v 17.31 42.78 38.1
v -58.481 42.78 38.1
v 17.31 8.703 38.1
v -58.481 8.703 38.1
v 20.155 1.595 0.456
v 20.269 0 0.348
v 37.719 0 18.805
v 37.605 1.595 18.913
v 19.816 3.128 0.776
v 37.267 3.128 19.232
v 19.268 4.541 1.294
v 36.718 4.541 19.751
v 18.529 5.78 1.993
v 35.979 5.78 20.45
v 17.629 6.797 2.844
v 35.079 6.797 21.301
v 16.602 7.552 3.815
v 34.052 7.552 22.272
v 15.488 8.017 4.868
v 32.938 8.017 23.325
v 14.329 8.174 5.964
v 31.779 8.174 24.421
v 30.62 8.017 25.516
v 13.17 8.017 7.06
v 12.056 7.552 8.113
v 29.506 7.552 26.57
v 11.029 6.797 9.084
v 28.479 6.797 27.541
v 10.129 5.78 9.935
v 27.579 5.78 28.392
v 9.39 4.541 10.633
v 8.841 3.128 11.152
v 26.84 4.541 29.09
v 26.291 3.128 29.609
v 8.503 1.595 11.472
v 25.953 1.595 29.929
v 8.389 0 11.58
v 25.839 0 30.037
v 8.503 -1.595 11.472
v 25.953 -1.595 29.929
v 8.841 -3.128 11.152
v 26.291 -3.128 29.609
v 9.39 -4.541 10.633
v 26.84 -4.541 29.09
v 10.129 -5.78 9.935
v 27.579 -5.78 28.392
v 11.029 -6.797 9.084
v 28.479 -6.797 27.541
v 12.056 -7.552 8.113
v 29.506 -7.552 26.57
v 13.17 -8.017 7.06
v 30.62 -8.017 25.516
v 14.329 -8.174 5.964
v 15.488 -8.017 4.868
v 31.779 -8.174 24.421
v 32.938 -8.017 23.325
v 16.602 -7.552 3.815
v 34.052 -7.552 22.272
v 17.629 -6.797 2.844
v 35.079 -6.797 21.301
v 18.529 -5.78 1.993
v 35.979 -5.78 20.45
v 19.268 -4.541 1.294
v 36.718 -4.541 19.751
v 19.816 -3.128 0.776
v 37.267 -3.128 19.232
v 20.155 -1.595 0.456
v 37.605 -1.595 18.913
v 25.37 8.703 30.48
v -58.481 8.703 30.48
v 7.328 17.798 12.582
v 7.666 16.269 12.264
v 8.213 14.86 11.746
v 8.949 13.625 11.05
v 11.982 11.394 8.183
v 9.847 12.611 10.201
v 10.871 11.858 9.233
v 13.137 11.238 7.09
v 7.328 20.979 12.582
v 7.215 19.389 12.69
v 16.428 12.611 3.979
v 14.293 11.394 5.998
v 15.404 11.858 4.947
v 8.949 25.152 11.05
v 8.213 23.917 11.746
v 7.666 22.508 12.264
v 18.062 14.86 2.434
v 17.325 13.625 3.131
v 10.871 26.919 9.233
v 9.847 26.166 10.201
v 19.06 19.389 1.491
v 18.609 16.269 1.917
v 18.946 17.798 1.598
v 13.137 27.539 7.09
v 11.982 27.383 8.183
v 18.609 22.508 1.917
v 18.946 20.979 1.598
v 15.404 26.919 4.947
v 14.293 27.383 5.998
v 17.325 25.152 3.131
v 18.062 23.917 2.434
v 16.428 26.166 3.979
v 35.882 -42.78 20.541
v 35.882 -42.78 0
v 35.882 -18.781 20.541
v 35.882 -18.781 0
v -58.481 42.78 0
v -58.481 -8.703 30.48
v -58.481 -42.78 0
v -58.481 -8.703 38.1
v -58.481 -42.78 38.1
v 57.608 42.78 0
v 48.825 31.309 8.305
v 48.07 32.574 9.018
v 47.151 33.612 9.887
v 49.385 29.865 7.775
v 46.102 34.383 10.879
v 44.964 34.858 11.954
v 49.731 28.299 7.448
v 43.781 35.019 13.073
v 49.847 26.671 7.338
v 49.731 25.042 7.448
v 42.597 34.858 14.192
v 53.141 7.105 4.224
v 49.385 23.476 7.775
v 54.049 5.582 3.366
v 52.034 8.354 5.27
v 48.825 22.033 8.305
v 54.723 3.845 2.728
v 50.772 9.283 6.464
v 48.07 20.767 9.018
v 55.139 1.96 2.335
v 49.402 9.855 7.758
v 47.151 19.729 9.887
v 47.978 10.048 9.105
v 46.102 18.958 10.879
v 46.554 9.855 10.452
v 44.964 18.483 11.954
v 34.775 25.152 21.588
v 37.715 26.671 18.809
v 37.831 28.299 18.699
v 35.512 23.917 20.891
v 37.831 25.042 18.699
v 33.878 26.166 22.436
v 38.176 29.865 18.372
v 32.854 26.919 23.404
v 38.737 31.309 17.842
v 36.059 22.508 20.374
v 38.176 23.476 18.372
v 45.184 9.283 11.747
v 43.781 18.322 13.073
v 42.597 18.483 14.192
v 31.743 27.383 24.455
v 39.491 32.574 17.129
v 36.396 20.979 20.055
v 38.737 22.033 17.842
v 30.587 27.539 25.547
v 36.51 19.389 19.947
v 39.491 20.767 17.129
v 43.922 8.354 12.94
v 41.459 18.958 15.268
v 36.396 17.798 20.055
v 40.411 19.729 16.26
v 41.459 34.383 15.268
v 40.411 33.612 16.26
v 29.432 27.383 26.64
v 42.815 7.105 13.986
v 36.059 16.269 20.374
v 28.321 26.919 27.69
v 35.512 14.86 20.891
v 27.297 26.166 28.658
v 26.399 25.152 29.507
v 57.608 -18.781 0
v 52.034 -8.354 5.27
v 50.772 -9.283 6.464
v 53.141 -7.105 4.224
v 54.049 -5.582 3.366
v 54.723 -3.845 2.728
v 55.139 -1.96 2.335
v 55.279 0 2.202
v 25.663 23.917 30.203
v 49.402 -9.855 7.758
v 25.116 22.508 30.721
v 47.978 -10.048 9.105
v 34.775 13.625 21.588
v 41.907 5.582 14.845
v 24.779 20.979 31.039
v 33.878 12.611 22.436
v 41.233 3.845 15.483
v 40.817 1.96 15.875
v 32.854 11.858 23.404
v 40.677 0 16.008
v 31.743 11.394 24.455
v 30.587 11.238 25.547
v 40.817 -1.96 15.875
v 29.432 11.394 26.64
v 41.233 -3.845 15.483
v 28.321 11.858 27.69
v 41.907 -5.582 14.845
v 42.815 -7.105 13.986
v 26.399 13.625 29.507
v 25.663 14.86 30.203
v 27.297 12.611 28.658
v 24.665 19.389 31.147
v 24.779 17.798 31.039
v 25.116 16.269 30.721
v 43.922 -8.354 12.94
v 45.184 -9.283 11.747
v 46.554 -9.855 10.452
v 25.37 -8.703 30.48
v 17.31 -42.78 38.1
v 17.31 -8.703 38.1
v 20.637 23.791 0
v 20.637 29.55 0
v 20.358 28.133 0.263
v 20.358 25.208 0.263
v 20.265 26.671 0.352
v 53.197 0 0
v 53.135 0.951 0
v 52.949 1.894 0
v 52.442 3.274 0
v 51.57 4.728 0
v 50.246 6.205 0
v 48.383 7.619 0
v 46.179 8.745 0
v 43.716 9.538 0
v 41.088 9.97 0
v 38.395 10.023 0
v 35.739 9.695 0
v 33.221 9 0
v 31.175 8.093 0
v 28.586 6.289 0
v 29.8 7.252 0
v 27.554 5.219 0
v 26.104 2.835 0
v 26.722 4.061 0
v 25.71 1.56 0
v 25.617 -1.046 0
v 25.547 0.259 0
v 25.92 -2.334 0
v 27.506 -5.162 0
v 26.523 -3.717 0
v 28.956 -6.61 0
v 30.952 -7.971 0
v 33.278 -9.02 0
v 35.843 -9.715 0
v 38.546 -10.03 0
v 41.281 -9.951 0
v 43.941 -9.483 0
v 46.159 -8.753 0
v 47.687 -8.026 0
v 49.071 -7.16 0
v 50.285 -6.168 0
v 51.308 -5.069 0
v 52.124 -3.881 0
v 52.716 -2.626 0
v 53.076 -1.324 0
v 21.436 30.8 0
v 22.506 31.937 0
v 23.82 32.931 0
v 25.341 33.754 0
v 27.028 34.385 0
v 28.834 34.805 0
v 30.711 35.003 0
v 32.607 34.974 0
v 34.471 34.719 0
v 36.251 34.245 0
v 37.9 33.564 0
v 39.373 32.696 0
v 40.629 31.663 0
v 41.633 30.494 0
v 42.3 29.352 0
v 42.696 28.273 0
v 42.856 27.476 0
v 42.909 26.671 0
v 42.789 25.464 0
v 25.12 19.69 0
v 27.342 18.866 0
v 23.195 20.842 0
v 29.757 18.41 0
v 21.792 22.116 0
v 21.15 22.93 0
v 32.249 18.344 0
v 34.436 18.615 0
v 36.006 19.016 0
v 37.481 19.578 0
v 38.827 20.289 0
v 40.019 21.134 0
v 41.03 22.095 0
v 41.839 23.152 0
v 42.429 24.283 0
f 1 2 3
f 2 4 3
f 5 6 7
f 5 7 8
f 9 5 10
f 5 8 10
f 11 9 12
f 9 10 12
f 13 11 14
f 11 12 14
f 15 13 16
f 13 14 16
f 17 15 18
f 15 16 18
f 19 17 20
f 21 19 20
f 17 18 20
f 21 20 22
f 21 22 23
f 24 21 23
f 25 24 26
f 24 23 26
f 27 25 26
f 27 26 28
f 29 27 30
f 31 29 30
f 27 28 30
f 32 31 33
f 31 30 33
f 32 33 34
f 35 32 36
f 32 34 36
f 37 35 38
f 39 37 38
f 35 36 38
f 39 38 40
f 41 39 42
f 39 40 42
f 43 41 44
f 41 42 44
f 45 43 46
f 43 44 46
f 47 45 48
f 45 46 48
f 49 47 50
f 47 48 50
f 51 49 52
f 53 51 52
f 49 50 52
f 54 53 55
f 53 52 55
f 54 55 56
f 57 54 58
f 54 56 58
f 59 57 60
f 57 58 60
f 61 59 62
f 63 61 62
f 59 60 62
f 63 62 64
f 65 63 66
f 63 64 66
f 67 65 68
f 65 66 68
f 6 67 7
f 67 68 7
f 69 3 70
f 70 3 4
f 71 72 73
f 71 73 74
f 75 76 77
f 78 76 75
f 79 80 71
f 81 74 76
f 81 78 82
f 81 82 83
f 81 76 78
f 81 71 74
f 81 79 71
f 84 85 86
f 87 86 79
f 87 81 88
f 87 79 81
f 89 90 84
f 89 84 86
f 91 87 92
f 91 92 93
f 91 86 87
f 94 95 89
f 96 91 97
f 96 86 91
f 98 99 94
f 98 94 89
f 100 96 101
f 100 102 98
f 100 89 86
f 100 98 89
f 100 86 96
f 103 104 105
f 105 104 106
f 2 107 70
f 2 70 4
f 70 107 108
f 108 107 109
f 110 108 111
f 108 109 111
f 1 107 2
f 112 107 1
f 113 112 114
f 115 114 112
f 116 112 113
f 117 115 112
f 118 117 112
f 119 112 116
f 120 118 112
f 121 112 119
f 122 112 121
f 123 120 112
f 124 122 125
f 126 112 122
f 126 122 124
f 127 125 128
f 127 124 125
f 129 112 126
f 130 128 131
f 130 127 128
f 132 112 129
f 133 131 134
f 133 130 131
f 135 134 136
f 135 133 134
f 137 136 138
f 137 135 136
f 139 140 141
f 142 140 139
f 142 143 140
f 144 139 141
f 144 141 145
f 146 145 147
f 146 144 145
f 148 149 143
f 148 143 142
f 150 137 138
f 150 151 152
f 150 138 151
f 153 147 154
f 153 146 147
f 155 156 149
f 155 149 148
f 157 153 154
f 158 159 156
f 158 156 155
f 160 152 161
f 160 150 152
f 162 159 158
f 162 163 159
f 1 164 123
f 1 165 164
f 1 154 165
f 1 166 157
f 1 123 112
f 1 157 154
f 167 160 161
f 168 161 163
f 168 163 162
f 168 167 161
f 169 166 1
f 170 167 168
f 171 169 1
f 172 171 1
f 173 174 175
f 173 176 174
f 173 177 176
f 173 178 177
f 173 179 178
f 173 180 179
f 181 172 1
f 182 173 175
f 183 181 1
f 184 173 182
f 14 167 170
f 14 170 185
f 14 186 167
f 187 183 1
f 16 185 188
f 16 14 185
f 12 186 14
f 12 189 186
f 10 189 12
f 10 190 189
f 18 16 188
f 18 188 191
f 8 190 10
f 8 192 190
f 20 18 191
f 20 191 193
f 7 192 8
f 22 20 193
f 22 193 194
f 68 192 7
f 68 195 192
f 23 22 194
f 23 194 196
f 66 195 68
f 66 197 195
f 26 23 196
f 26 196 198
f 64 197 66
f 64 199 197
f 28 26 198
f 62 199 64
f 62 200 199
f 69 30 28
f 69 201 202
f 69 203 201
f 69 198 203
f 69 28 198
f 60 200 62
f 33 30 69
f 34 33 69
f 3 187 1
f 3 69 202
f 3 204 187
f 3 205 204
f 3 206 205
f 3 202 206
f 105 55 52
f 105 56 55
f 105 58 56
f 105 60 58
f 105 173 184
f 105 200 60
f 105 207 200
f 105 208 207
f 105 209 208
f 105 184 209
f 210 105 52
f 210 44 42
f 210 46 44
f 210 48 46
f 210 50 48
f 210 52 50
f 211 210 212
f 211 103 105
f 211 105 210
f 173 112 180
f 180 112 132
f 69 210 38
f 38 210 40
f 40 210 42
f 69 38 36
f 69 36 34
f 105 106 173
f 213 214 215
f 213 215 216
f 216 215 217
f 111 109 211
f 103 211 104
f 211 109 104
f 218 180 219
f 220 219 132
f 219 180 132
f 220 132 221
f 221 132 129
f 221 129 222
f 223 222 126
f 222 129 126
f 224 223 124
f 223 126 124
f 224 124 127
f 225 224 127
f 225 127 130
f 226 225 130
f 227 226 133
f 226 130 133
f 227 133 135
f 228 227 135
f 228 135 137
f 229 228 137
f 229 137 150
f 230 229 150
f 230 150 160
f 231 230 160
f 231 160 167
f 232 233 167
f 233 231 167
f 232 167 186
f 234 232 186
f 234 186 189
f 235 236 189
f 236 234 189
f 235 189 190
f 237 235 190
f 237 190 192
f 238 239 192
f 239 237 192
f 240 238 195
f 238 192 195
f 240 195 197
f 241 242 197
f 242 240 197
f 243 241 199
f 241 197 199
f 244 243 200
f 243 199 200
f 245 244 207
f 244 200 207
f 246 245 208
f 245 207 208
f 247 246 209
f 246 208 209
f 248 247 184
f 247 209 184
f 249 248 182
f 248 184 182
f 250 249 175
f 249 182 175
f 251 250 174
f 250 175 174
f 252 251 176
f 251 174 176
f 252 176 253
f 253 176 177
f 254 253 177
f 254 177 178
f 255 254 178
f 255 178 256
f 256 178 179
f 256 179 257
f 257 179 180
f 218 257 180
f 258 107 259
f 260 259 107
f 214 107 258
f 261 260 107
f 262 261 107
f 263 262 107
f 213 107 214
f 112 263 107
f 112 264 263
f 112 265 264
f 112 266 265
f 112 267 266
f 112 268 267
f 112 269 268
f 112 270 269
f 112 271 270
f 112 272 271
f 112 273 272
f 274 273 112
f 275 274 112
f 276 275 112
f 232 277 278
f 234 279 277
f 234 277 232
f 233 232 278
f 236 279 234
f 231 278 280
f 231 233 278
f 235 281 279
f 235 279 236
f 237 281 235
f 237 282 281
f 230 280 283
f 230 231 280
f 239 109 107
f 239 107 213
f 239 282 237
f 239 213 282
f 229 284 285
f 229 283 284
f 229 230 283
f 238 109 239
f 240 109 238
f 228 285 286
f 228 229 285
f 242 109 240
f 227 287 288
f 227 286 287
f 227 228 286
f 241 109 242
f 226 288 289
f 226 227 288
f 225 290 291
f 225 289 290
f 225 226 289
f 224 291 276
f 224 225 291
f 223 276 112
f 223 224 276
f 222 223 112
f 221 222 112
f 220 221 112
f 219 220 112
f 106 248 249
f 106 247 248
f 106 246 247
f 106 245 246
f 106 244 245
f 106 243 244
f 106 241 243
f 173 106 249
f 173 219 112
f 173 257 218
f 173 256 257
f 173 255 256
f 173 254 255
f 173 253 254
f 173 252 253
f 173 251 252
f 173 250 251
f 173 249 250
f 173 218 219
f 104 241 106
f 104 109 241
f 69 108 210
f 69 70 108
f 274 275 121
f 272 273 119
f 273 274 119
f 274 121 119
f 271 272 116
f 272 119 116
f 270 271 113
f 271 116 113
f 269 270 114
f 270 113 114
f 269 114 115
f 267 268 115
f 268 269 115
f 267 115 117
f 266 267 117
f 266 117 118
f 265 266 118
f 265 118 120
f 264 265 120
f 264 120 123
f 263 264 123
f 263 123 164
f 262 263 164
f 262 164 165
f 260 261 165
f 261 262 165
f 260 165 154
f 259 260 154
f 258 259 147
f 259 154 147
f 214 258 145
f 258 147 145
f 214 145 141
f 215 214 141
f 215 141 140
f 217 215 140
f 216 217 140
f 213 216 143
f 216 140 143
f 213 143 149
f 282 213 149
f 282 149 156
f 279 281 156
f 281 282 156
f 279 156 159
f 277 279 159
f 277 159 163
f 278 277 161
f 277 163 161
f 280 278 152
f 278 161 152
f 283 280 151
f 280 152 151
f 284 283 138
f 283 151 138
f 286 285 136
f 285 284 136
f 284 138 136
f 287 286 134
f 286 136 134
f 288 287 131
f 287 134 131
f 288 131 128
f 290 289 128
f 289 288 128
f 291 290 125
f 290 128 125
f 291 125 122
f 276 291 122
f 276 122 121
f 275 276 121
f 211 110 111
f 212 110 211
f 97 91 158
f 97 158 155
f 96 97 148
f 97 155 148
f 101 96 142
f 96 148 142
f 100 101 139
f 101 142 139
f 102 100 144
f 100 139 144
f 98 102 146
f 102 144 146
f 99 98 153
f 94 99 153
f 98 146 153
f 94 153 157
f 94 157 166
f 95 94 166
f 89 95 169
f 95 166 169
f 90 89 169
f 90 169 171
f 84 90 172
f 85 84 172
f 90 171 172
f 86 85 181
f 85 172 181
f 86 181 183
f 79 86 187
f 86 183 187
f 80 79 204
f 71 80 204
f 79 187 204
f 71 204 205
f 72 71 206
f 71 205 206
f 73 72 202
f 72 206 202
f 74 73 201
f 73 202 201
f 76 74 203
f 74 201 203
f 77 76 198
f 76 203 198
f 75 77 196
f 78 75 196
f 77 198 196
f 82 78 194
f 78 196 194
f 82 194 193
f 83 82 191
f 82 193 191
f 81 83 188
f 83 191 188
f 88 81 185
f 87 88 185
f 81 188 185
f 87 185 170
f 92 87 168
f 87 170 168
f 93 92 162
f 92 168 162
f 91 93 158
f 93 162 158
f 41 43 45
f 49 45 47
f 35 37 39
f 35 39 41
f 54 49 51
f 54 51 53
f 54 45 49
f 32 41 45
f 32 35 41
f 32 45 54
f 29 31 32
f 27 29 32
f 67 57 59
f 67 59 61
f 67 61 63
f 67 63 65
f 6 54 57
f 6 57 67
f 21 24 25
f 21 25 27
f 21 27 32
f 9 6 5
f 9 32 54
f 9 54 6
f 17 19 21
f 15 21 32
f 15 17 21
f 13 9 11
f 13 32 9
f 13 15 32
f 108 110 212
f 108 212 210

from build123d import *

# Parameters (mm, degrees)
F0_W      = 116.9611811638
F0_H      = 60.1601935923
F1_DEPTH  = 38.1
F3_DEPTH  = 31.75
F4_W      = 8.79971501
F4_H      = 17.4067560583
F4_W_2    = 75.7910068654
F5_DEPTH  = 7.62
F6_DEPTH  = 12.7
F7_DEPTH  = 12.7
F8_W      = 25.9574428201
F8_H      = 27.7897324413
F9_DEPTH  = 25.4
F10_R     = 8.1507716862
F11_DEPTH = 25.4
F12_R     = 8.1743450513
F13_DEPTH = 25.4
F14_R     = 10.0476315022
F15_DEPTH = 25.4
F16_R     = 8.34829694
F17_DEPTH = 25.4


with BuildPart() as f1:
    # F0 (on Top) → F1 (new body)
    with BuildSketch(Plane.XY):
        Rectangle(F0_W, F0_H)
    extrude(amount=F1_DEPTH)

    # F2 (on Front) → F3 (cut, symmetric)
    with BuildSketch(Plane.XZ):
        Polygon((13.2841020823, 43.822273612), (14.8110100999, 40.4630750418), (65.1989877224, -7.1764695458), (65.1989877224, 43.822273612), align=None)
    extrude(amount=F3_DEPTH, both=True, mode=Mode.SUBTRACT)

    # F4 (on face) → F5 (cut)
    with BuildSketch(Plane.XY.offset(38.1)):
        with Locations((21.7102737885, 0)):
            Rectangle(F4_W, F4_H)
        with Locations((-20.5850871492, 0)):
            Rectangle(F4_W_2, F4_H)
    extrude(amount=-F5_DEPTH, mode=Mode.SUBTRACT)

    # F6 (add): a face of the model
    f6_faces = [f1.faces().sort_by_distance(p)[0] for p in [
        (-9.8052950563, -30.0800967962, 17.7163922315),
    ]]
    extrude(f6_faces, amount=F6_DEPTH)

    # F7 (add): a face of the model
    f7_faces = [f1.faces().sort_by_distance(p)[0] for p in [
        (-9.8052950563, 30.0800967962, 17.7163922315),
    ]]
    extrude(f7_faces, amount=F7_DEPTH)

    # F8 (on Top) → F9 (cut)
    with BuildSketch(Plane.XY):
        with Locations((48.8610677421, -32.6758408919)):
            Rectangle(F8_W, F8_H)
    extrude(amount=F9_DEPTH, mode=Mode.SUBTRACT)

    # F10 (on face) → F11 (cut)
    with BuildSketch(Plane(origin=(27.1903243303, 0, 28.7589956151), x_dir=(0.7266466393, 0, -0.6870113985), z_dir=(0.6870113985, 0, 0.7266466393))):
        with Locations((4.6751173213, 19.3886086345)):
            Circle(F10_R)
    extrude(amount=-F11_DEPTH, mode=Mode.SUBTRACT)

    # F12 (on face) → F13 (cut)
    with BuildSketch(Plane(origin=(27.1903243303, 0, 28.7589956151), x_dir=(0.7266466393, 0, -0.6870113985), z_dir=(0.6870113985, 0, 0.7266466393))):
        with Locations((6.3146823086, 0)):
            Circle(F12_R)
    extrude(amount=-F13_DEPTH, mode=Mode.SUBTRACT)

    # F14 (on face) → F15 (cut)
    with BuildSketch(Plane(origin=(27.1903243303, 0, 28.7589956151), x_dir=(0.7266466393, 0, -0.6870113985), z_dir=(0.6870113985, 0, 0.7266466393))):
        with Locations((28.6077186465, 0)):
            Circle(F14_R)
    extrude(amount=-F15_DEPTH, mode=Mode.SUBTRACT)

    # F16 (on face) → F17 (cut)
    with BuildSketch(Plane(origin=(27.1903243303, 0, 28.7589956151), x_dir=(0.7266466393, 0, -0.6870113985), z_dir=(0.6870113985, 0, 0.7266466393))):
        with Locations((22.8316728026, 26.6705863178)):
            Circle(F16_R)
    extrude(amount=-F17_DEPTH, mode=Mode.SUBTRACT)


solid = f1.part
